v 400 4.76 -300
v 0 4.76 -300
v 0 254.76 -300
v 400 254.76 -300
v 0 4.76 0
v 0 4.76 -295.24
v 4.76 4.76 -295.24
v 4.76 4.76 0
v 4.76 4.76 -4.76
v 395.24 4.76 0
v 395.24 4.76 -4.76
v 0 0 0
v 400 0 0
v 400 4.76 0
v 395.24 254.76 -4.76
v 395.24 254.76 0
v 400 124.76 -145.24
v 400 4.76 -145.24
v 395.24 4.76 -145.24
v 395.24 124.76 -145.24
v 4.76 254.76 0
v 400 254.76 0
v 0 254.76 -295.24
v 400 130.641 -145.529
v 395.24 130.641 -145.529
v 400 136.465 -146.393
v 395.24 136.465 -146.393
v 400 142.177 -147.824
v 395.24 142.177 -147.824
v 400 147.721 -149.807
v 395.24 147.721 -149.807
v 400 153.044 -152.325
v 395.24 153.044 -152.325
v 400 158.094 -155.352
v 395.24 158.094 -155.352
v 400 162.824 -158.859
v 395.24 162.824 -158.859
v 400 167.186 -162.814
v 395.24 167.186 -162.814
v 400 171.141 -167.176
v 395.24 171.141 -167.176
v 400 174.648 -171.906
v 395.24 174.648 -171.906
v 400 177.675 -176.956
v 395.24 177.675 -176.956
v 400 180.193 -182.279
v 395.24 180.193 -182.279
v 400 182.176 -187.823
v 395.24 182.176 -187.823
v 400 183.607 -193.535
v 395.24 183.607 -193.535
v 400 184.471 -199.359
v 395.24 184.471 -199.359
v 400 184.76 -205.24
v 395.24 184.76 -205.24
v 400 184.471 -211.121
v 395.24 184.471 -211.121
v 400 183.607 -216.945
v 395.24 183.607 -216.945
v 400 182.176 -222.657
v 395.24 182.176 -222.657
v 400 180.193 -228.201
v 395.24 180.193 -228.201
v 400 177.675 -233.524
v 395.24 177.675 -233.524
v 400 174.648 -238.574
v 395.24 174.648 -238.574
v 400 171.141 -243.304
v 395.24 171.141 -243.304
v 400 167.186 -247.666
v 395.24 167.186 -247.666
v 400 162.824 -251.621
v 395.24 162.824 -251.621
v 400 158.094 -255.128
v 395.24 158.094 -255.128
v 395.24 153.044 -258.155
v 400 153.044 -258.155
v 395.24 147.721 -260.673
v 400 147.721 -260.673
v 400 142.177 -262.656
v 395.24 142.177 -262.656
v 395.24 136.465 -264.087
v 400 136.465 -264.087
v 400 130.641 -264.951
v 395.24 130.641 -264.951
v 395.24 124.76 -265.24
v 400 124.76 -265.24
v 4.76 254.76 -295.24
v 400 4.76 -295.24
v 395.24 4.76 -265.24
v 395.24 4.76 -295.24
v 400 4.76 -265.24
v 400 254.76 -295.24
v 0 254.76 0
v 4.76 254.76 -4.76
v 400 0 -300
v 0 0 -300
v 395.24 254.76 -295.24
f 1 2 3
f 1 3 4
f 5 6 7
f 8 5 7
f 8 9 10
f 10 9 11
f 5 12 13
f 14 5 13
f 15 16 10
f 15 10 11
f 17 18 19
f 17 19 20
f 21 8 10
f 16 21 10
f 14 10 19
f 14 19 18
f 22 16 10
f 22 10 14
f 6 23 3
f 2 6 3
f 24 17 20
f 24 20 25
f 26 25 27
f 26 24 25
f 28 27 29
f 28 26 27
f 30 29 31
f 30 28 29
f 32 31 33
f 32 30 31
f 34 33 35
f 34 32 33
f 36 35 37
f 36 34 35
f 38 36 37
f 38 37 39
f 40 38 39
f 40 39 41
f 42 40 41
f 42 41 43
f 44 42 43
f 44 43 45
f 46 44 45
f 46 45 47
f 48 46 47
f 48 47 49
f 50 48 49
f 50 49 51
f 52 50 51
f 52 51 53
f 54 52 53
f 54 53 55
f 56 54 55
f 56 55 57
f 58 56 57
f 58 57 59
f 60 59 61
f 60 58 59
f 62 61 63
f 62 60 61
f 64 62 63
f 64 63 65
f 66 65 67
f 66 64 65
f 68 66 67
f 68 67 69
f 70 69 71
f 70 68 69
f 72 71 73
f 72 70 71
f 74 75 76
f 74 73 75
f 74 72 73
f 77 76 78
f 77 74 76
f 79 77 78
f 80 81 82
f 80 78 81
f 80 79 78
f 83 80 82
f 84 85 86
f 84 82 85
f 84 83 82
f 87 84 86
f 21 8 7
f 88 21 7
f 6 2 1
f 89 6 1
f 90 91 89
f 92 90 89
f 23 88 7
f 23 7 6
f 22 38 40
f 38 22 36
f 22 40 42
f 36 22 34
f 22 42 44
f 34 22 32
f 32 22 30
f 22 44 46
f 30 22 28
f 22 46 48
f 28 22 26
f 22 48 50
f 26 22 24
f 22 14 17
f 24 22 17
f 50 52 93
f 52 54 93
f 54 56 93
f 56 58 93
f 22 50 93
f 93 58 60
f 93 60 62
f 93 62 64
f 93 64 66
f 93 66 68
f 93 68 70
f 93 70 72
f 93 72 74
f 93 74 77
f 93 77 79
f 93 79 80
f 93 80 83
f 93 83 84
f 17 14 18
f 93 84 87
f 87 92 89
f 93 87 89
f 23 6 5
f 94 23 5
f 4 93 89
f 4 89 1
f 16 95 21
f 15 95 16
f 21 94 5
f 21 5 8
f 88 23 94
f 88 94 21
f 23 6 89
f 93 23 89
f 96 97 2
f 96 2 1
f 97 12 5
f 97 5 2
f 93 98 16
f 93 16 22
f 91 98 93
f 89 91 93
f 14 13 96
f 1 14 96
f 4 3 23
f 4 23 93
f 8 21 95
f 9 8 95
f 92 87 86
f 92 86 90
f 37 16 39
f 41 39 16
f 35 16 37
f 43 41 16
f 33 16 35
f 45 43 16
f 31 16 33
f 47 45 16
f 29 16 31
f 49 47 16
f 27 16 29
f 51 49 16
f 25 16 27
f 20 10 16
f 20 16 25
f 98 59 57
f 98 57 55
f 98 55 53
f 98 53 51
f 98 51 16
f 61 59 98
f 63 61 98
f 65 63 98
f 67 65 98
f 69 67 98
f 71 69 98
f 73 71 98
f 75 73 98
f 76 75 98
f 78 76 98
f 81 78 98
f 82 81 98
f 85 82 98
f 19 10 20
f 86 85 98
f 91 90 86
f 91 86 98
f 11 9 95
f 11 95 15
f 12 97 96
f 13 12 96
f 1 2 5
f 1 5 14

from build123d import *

# Parameters (mm, degrees)
BASE_W              = 400
BASE_H              = 300
BASE_EXTRUDE_DEPTH  = 4.76
BOSS_EXTRUDE2_START = 4.76
BOSS_EXTRUDE2_DEPTH = 250
BOSS_EXTRUDE3_START = 4.76
SKETCH2_3_W         = 400
SKETCH2_3_H         = 4.76
BOSS_EXTRUDE3_DEPTH = 250
BOSS_EXTRUDE4_START = 4.76
SKETCH2_4_W         = 4.76
SKETCH2_4_H         = 295.24
BOSS_EXTRUDE4_DEPTH = 250
BOSS_EXTRUDE5_START = 4.76
SKETCH2_5_W         = 390.48
SKETCH2_5_H         = 4.76
BOSS_EXTRUDE5_DEPTH = 250
CUT_EXTRUDE1_DEPTH  = 5


with BuildPart() as part:
    # base → base-extrude (new body)
    with BuildSketch(Plane(origin=(0, 0, 0), x_dir=(1, 0, 0), z_dir=(0, 1, 0))):
        with Locations((200, 150)):
            Rectangle(BASE_W, BASE_H)
    extrude(amount=BASE_EXTRUDE_DEPTH)


with BuildPart() as body_2:
    # Sketch2 → Boss-Extrude2 (new body)
    with BuildSketch(Plane(origin=(0, 0, 0), x_dir=(1, 0, 0), z_dir=(0, 1, 0)).offset(BOSS_EXTRUDE2_START)):
        Polygon((4.76, 295.24), (0, 295.24), (0, 0), (4.76, 0), (4.76, 4.76), align=None)
    extrude(amount=BOSS_EXTRUDE2_DEPTH)


with BuildPart() as body_3:
    # Sketch2<3> → Boss-Extrude3 (new body)
    with BuildSketch(Plane(origin=(0, 0, 0), x_dir=(1, 0, 0), z_dir=(0, 1, 0)).offset(BOSS_EXTRUDE3_START)):
        with Locations((200, 297.62)):
            Rectangle(SKETCH2_3_W, SKETCH2_3_H)
    extrude(amount=BOSS_EXTRUDE3_DEPTH)


with BuildPart() as body_4:
    # Sketch2<4> → Boss-Extrude4 (new body)
    with BuildSketch(Plane(origin=(0, 0, 0), x_dir=(1, 0, 0), z_dir=(0, 1, 0)).offset(BOSS_EXTRUDE4_START)):
        with Locations((397.62, 147.62)):
            Rectangle(SKETCH2_4_W, SKETCH2_4_H)
    extrude(amount=BOSS_EXTRUDE4_DEPTH)

    # Sketch3 → Cut-Extrude1 (cut)
    with BuildSketch(Plane(origin=(400, 0, 0), x_dir=(0, 0, -1), z_dir=(1, 0, 0))):
        with BuildLine():
            Line((145.24, 4.76), (145.24, 124.76))
            ThreePointArc((145.24, 124.76), (205.24, 184.76), (265.24, 124.76))
            Line((265.24, 124.76), (265.24, 4.76))
            Line((265.24, 4.76), (145.24, 4.76))
        make_face()
    extrude(amount=-CUT_EXTRUDE1_DEPTH, mode=Mode.SUBTRACT)


with BuildPart() as body_5:
    # Sketch2<5> → Boss-Extrude5 (new body)
    with BuildSketch(Plane(origin=(0, 0, 0), x_dir=(1, 0, 0), z_dir=(0, 1, 0)).offset(BOSS_EXTRUDE5_START)):
        with Locations((200, 2.38)):
            Rectangle(SKETCH2_5_W, SKETCH2_5_H)
    extrude(amount=BOSS_EXTRUDE5_DEPTH)


solid = Compound([part.part, body_2.part, body_3.part, body_4.part, body_5.part])
